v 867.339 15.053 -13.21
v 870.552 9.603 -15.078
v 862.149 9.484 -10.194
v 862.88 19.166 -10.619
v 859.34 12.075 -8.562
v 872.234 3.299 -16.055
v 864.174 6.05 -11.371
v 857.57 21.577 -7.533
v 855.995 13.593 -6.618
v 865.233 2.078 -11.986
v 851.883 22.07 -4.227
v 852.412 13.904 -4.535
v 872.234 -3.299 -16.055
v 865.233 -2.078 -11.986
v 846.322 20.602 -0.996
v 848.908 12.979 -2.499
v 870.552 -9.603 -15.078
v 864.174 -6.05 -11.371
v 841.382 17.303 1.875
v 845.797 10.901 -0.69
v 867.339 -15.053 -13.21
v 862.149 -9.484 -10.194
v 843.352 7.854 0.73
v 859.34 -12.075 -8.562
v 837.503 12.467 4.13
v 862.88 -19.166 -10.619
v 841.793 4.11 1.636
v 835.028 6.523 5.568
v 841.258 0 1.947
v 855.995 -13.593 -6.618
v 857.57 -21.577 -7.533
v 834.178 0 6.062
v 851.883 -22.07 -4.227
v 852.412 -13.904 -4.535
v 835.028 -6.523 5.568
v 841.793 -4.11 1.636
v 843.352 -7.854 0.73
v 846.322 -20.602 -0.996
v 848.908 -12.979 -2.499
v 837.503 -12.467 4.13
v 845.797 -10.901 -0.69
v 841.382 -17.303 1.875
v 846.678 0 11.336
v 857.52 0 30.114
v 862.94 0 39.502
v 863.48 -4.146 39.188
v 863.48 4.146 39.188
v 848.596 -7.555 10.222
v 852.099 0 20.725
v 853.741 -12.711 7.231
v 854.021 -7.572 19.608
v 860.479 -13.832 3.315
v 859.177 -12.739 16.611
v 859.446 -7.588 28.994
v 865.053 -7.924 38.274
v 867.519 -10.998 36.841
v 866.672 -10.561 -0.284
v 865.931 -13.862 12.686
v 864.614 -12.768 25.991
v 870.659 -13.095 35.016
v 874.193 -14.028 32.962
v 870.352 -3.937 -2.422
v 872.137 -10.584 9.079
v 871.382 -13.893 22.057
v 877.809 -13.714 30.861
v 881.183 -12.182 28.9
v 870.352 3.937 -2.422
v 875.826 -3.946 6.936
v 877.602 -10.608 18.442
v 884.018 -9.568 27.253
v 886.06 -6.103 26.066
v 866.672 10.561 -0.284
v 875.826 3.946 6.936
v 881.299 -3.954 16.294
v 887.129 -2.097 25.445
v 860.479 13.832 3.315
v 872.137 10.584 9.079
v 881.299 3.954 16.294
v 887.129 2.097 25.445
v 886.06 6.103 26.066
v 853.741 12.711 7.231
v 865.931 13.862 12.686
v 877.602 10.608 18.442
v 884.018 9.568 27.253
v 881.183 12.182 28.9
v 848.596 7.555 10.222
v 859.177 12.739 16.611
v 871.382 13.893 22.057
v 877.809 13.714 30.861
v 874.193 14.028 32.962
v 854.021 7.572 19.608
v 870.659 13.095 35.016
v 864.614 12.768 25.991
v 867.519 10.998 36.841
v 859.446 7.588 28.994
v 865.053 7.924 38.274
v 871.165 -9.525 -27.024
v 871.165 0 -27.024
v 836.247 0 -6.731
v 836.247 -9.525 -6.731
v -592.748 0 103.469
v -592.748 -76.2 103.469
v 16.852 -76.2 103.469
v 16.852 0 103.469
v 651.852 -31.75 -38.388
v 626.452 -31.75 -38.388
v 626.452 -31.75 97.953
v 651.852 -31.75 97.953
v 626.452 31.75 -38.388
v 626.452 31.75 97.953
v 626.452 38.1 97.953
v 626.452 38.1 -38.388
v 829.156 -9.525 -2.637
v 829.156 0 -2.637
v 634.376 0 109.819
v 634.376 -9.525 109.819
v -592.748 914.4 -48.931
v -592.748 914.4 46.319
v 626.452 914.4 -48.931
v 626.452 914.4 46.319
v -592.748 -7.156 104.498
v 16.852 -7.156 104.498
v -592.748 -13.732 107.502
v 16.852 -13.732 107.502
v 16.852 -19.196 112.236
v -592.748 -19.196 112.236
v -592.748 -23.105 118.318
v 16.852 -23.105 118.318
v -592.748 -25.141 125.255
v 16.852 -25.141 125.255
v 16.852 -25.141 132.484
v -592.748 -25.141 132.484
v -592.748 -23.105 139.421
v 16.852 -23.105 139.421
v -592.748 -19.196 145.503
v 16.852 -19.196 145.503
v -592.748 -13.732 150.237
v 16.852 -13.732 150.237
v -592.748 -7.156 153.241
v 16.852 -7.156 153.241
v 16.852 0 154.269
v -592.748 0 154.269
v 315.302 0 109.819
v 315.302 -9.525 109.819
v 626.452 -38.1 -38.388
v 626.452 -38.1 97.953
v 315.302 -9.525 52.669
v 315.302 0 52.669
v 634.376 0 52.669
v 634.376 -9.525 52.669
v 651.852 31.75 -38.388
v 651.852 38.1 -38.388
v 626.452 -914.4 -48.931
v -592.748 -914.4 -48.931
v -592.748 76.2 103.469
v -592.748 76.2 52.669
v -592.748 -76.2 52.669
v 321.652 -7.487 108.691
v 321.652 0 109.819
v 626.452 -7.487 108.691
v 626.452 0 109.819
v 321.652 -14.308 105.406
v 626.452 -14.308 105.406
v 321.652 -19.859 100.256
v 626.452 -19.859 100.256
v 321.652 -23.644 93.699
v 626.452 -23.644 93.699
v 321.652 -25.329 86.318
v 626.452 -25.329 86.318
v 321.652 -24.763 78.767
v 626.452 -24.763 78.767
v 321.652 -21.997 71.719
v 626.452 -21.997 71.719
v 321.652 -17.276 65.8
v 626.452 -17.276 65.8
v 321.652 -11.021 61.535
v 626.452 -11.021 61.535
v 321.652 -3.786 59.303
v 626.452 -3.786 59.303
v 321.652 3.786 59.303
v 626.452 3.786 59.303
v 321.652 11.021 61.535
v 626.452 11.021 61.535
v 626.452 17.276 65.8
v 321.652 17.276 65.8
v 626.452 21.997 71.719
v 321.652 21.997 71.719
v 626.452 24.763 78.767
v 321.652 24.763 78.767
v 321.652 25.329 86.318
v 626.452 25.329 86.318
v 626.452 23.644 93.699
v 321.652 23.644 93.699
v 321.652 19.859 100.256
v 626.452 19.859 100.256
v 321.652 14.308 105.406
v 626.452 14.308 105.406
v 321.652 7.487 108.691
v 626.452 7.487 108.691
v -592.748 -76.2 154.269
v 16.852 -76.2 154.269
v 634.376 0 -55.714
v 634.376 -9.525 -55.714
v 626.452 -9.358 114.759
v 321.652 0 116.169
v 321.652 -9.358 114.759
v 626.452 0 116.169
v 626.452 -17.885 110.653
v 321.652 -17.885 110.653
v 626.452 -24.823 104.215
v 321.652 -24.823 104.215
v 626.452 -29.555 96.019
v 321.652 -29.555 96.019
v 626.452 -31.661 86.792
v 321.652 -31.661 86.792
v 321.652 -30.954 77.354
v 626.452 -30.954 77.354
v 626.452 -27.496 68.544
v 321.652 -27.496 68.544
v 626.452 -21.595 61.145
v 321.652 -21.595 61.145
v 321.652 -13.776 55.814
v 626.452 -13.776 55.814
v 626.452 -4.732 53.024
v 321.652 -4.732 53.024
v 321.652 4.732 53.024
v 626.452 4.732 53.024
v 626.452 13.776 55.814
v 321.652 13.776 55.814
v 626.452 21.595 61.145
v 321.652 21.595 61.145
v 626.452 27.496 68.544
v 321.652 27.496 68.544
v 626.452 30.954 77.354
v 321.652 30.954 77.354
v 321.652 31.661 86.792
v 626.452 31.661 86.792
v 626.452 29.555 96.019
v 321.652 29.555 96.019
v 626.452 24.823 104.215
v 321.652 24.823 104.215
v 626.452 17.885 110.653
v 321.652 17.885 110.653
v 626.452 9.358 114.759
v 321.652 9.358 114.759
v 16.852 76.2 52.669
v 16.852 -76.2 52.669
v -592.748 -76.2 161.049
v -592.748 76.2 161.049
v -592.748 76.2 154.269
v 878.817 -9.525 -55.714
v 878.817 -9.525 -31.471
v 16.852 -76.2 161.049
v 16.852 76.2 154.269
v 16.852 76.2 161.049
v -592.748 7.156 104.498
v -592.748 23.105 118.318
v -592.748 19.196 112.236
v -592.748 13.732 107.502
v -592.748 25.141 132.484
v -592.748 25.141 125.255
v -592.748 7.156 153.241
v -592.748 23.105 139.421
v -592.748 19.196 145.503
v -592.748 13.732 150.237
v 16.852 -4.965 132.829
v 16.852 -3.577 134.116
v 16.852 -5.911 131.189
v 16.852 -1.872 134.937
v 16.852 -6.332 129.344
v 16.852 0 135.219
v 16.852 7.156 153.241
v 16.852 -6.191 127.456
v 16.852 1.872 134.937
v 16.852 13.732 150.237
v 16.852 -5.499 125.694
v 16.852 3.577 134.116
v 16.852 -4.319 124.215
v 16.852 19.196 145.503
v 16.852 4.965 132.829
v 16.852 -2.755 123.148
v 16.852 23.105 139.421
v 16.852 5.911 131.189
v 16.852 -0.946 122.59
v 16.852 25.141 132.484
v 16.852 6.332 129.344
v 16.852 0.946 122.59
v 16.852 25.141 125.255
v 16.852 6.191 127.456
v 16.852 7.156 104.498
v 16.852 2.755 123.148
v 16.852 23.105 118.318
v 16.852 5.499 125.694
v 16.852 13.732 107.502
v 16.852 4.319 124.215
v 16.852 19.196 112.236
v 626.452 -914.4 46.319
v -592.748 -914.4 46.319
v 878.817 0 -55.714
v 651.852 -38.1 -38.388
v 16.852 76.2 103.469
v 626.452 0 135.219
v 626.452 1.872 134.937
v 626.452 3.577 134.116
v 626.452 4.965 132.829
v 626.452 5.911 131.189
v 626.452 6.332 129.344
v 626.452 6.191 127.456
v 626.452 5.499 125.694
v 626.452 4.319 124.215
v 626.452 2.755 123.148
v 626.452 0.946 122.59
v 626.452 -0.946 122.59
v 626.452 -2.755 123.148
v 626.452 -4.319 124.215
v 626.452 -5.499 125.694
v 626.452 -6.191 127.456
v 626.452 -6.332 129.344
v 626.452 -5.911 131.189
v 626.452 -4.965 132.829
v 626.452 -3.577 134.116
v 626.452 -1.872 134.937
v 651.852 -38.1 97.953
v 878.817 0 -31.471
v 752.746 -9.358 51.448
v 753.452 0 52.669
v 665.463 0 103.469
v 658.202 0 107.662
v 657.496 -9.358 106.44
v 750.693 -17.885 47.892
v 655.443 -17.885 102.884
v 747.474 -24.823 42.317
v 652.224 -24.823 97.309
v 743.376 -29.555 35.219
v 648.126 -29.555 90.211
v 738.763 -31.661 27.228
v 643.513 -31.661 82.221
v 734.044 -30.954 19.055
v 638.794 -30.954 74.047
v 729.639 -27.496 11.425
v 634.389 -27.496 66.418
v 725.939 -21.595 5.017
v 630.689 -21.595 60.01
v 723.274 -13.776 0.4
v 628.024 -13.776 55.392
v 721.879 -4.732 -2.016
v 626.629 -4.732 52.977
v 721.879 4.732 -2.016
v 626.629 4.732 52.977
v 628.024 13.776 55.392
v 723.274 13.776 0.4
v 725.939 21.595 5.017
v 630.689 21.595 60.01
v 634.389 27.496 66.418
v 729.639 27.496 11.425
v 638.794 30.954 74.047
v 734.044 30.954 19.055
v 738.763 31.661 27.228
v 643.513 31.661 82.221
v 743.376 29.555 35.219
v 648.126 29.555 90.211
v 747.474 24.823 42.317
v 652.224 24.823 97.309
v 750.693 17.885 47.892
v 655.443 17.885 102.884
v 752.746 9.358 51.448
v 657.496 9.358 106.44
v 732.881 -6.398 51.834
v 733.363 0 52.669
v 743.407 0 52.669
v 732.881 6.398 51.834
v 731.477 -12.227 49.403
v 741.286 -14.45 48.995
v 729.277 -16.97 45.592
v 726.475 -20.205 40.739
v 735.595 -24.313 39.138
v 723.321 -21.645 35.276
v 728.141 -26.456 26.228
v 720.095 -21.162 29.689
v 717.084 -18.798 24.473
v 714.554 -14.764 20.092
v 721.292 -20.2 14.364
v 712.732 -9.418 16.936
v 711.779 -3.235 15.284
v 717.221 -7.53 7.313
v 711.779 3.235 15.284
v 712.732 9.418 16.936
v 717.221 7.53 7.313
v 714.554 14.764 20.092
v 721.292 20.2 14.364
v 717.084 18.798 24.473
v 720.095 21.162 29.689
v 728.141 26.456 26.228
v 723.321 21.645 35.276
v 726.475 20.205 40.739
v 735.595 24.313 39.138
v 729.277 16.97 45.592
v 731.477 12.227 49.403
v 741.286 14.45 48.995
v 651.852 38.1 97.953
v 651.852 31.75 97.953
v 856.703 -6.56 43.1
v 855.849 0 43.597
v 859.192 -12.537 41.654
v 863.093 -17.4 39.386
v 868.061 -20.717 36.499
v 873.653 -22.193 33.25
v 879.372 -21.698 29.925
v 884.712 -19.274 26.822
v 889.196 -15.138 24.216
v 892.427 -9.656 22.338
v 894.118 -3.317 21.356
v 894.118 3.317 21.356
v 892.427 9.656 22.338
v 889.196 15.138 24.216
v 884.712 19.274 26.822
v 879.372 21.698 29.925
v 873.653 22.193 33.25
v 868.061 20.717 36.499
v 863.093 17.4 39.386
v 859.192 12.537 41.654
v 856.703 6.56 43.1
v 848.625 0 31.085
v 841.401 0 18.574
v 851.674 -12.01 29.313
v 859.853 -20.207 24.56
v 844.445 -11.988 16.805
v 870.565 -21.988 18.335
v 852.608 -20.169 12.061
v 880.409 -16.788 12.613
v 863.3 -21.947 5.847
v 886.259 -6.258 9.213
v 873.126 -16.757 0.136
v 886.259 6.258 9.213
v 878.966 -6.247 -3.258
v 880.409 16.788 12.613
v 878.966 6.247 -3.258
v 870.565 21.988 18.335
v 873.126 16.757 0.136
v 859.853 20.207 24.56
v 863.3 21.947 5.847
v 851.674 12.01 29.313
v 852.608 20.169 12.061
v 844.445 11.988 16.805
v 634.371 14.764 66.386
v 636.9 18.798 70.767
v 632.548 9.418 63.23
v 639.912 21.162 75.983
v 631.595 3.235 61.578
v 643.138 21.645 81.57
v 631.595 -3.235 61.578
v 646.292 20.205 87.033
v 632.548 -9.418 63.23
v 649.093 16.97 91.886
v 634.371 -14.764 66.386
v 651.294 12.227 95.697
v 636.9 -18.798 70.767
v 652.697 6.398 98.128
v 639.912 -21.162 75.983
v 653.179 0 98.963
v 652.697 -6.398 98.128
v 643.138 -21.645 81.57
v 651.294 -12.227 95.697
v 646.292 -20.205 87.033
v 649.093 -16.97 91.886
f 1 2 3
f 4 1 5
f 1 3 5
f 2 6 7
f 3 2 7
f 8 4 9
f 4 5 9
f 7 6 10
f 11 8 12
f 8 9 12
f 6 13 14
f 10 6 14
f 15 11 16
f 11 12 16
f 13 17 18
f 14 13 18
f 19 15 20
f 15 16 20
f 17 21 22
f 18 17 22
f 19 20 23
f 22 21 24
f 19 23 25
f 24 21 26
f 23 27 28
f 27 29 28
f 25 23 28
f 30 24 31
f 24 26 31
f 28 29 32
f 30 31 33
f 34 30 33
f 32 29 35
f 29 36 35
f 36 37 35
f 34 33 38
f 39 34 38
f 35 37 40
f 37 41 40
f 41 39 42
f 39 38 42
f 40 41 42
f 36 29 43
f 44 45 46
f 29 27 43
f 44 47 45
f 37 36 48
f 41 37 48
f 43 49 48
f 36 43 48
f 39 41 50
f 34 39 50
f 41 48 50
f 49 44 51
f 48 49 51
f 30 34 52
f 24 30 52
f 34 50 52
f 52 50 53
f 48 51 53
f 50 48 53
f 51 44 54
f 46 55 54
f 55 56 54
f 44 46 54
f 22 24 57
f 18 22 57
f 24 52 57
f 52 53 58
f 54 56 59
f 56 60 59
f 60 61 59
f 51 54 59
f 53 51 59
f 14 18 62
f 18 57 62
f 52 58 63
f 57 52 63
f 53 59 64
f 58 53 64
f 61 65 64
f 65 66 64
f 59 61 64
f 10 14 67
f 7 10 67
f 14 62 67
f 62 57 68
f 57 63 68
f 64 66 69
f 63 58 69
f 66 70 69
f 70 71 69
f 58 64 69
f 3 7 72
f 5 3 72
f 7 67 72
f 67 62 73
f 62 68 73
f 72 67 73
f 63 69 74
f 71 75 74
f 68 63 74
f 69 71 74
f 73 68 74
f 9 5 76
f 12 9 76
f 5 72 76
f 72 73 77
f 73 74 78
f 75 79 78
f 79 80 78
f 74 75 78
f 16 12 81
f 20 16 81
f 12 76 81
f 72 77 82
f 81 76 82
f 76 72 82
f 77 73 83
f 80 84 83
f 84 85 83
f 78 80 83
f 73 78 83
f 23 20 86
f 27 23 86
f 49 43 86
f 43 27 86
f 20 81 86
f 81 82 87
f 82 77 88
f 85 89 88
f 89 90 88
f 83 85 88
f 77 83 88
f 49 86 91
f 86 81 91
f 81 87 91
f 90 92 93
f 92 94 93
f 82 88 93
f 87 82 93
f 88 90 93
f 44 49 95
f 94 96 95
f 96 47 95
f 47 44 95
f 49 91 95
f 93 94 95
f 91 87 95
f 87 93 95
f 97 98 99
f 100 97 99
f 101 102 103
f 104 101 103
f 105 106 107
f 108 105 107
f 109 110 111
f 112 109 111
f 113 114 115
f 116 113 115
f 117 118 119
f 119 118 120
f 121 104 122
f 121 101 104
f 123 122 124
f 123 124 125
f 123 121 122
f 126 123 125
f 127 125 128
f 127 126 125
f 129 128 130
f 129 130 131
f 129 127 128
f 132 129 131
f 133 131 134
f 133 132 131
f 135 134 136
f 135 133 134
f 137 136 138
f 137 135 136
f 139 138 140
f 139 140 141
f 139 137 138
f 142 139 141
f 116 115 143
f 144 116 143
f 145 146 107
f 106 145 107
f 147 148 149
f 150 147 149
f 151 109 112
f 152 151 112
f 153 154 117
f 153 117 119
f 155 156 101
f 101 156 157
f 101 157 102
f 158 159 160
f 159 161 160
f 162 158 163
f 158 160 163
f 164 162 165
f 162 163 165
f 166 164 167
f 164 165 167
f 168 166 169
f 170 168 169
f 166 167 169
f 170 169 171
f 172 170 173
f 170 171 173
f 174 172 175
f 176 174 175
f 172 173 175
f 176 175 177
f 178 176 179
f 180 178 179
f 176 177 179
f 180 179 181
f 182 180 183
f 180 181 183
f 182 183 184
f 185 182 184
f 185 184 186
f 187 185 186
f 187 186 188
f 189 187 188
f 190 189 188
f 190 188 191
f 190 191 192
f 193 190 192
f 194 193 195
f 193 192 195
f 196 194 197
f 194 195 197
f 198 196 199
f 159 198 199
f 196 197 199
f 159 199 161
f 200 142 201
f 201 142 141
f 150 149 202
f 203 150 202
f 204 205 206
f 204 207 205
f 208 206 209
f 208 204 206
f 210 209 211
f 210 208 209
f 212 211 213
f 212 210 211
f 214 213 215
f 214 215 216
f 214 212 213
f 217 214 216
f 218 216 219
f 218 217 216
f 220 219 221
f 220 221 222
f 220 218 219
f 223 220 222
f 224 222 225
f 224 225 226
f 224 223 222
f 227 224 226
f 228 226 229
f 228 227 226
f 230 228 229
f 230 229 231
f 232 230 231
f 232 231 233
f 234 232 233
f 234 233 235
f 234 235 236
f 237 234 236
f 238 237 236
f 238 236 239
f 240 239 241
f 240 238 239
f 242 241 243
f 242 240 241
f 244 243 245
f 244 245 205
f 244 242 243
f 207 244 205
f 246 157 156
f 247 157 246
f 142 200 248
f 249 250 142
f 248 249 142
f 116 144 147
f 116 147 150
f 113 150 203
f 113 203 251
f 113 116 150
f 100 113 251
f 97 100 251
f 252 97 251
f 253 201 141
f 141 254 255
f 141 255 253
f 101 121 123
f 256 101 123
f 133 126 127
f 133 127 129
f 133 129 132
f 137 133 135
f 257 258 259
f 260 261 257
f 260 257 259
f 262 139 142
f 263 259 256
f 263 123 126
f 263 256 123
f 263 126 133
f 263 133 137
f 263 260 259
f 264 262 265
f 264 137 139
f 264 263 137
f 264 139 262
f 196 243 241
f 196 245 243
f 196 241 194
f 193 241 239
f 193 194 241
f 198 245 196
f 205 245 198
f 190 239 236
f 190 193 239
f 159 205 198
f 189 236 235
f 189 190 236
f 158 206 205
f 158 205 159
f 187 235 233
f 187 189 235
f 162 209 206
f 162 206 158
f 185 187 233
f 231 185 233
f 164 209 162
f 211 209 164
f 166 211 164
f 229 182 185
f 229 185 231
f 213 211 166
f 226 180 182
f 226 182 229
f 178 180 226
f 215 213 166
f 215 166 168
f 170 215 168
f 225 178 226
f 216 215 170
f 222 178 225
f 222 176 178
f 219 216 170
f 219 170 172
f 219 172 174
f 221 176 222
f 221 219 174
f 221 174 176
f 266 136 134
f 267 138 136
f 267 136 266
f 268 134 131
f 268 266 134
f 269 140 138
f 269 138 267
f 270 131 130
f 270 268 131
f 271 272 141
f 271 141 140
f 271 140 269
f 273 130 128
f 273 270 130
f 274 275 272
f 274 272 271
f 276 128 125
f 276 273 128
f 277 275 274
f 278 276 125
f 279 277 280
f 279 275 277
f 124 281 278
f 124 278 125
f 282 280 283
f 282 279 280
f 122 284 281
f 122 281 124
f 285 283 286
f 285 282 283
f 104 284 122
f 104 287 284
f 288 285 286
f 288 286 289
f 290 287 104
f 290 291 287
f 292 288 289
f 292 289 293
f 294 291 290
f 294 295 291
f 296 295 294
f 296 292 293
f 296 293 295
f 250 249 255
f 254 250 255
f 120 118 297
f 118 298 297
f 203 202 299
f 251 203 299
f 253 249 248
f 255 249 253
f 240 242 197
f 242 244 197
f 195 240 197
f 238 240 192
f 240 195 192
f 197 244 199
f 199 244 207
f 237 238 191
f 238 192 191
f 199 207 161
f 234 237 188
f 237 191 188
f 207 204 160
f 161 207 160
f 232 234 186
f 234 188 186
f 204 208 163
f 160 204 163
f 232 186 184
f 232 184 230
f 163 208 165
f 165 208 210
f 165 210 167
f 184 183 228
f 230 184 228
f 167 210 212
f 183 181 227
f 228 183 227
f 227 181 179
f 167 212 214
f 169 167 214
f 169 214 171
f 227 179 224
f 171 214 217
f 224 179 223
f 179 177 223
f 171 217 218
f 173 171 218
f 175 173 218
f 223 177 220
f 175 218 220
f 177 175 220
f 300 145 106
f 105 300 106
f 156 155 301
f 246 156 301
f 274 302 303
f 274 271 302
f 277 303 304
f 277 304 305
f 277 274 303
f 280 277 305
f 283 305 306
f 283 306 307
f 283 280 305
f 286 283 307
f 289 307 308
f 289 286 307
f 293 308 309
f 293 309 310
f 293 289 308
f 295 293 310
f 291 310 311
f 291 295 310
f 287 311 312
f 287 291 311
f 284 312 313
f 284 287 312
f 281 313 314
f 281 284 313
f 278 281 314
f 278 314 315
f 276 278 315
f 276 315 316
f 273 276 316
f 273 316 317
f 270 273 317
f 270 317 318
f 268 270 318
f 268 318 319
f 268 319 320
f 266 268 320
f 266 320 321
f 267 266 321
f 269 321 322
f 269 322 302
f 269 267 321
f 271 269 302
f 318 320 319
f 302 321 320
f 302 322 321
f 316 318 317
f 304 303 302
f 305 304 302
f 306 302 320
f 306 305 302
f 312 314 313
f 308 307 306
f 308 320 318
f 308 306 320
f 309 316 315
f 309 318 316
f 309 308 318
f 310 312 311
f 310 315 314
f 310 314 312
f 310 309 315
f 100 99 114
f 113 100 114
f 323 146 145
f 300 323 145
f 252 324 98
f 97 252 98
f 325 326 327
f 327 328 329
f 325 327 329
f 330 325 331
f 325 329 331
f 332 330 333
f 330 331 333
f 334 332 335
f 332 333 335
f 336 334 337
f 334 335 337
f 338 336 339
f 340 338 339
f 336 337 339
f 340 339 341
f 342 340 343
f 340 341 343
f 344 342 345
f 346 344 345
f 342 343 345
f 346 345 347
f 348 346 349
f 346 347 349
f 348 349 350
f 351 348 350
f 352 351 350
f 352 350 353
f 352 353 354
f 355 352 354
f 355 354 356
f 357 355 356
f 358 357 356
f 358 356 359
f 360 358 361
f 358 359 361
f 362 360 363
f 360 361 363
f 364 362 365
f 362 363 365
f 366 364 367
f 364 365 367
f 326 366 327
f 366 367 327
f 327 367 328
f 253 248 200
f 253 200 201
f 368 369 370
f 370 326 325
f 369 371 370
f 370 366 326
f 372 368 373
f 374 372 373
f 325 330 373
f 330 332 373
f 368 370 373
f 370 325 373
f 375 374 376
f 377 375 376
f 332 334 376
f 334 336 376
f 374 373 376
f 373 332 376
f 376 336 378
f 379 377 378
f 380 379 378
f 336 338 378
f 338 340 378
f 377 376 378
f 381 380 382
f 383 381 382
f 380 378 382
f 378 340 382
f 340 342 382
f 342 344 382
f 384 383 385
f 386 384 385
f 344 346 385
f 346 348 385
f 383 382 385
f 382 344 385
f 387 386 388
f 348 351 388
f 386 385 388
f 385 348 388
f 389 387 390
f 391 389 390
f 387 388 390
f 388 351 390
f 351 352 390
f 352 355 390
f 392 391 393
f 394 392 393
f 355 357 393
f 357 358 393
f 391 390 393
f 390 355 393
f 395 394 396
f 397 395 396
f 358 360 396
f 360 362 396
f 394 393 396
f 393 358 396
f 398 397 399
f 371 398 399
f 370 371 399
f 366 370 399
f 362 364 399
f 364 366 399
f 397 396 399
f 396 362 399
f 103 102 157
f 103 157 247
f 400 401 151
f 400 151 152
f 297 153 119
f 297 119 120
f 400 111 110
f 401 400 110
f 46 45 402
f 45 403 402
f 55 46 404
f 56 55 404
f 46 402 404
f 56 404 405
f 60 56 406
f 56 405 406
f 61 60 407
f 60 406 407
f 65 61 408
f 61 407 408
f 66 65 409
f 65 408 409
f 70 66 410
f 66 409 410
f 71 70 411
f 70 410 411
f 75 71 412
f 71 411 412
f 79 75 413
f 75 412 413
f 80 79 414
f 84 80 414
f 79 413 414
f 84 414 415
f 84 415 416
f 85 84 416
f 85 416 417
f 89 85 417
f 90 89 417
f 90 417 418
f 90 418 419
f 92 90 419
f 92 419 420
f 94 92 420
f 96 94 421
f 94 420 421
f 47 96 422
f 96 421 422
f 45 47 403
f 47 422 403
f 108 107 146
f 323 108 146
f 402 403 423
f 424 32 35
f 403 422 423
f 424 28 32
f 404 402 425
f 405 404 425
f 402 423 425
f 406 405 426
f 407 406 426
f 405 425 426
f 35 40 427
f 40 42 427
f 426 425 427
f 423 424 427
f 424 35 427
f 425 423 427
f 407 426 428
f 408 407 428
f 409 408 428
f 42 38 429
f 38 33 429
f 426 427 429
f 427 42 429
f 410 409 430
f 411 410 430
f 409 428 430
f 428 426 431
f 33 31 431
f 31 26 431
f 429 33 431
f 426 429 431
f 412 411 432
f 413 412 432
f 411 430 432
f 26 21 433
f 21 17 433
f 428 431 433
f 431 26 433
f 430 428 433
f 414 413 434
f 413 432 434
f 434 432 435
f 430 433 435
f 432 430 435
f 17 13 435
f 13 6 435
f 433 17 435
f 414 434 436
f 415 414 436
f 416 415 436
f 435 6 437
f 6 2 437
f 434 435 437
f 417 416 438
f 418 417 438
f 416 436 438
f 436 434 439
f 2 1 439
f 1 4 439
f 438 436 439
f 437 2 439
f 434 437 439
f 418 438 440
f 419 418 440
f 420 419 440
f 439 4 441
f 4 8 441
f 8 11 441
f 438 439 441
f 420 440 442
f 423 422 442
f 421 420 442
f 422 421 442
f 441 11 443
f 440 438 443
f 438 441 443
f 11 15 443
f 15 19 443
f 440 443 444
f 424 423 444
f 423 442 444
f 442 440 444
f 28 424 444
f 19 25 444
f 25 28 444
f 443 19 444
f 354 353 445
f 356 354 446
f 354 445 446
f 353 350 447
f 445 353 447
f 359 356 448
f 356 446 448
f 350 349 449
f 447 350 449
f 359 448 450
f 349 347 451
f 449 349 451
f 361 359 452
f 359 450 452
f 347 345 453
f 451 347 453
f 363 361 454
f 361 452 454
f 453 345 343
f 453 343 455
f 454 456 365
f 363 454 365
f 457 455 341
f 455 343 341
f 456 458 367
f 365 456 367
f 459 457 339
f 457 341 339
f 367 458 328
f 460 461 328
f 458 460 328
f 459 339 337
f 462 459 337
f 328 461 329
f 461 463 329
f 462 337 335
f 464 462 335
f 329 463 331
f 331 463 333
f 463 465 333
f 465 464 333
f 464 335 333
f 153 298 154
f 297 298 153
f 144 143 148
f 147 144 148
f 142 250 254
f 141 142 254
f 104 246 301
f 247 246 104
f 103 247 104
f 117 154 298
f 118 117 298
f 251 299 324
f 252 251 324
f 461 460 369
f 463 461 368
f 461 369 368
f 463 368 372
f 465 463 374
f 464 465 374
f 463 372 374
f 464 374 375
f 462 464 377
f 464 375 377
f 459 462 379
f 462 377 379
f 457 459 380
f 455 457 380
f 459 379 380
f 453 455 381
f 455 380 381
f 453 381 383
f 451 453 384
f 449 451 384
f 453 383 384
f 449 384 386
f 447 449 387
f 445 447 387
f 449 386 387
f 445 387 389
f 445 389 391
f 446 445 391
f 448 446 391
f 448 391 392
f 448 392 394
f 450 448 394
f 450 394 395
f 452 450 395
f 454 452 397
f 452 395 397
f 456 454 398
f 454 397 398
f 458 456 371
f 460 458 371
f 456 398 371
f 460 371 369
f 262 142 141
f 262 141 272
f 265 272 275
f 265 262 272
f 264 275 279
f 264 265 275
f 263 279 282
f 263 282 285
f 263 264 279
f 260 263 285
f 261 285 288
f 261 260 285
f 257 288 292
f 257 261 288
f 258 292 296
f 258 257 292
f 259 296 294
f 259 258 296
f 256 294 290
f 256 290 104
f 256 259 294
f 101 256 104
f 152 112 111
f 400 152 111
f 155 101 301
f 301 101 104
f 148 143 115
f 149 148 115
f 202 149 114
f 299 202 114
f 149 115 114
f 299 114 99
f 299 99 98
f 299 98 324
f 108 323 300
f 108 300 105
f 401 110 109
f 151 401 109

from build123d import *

# Parameters (mm, degrees)
F0_W      = 304.8
F0_H      = 6.35
F0_W_2    = 609.6
F0_H_2    = 6.77982057
F0_H_3    = 50.8
F6_DEPTH  = 76.2
F0_W_3    = 1219.2
F0_H_4    = 95.25
F7_DEPTH  = 914.4
F9_DEPTH  = 25.4
F0_H_5    = 25.4
F10_DEPTH = 9.525


with BuildPart() as f1:
    # F0 (on Front) → F1 (revolve)
    with BuildSketch(Plane.XZ):
        Polygon((655.7809343297, 103.469426218), (653.179416568, 98.963465278), (733.3630443075, 52.669426218), (753.4515406549, 52.669426218), (665.4633596304, 103.469426218), align=None)
        Polygon((658.2015406549, 107.6620393584), (655.7809343297, 103.469426218), (665.4633596304, 103.469426218), align=None)
    revolve(axis=Axis((730.3147216794, 0, 29.3657327882), (0.8660254038, 0, -0.5)))


with BuildPart() as f2:
    # F0 (on Front) → F2 (revolve)
    with BuildSketch(Plane.XZ):
        with Locations((474.0515406549, 112.994426218)):
            Rectangle(F0_W, F0_H)
    revolve(axis=Axis((474.0515406549, 0, 84.419426218), (1, 0, 0)))


with BuildPart() as f3:
    # F0 (on Front) → F3 (revolve)
    with BuildSketch(Plane.XZ):
        Polygon((855.8485904794, 43.5967716205), (834.1779027039, 6.0620393584), (841.257744138, 1.9474267538), (862.9401510761, 39.502457201), align=None)
    revolve(axis=Axis((864.2175841779, 0, 13.7052027119), (0.5024767675, 0, 0.8645907113)))


with BuildPart() as f4:
    # F0 (on Front) → F4 (revolve)
    with BuildSketch(Plane.XZ):
        Polygon((-592.7484593451, 154.269426218), (-592.7484593451, 128.869426218), (16.8515406549, 128.869426218), (16.8515406549, 135.219426218), (16.8515406549, 154.269426218), align=None)
    revolve(axis=Axis((-287.9484593451, 0, 128.869426218), (-1, 0, 0)))

    # F0 (on Front) → F5 (revolve)
    with BuildSketch(Plane.XZ):
        Polygon((16.8515406549, 135.219426218), (16.8515406549, 128.869426218), (626.4515406549, 128.869426218), (626.4515406549, 135.219426218), (554.7779027039, 135.219426218), align=None)
    revolve(axis=Axis((321.6515406549, 0, 128.869426218), (-1, 0, 0)))

    # F0 (on Front) → F6 (join, symmetric)
    with BuildSketch(Plane.XZ):
        with Locations((-287.9484593451, 157.659336503)):
            Rectangle(F0_W_2, F0_H_2)
        with Locations((-287.9484593451, 78.069426218)):
            Rectangle(F0_W_2, F0_H_3)
    extrude(amount=F6_DEPTH, both=True)


with BuildPart() as f7:
    # F0 (on Front) → F7 (new body, symmetric)
    with BuildSketch(Plane.XZ):
        with Locations((16.8515406549, -1.305573782)):
            Rectangle(F0_W_3, F0_H_4)
    extrude(amount=F7_DEPTH, both=True)


with BuildPart() as f9:
    # F8 (on face) → F9 (new body)
    with BuildSketch(Plane.YZ.offset(626.4515406549)):
        Polygon((-31.75, -38.38833794), (-31.75, 84.419426218), (-31.75, 97.9532301426), (-38.1, 97.9532301426), (-38.1, -38.38833794), align=None)
    extrude(amount=F9_DEPTH)


with BuildPart() as f9b:
    # F8 (on face) → F9, piece 2 (new body)
    with BuildSketch(Plane.YZ.offset(626.4515406549)):
        Polygon((38.1, 97.9532301426), (31.75, 97.9532301426), (31.75, 84.419426218), (31.75, -14.3260782923), (31.75, -38.38833794), (38.1, -38.38833794), align=None)
    extrude(amount=F9_DEPTH)


with BuildPart() as f10:
    # F0 (on Front) → F10 (new body)
    with BuildSketch(Plane.XZ):
        with Locations((474.0515406549, 97.119426218)):
            Rectangle(F0_W, F0_H_5)
        Polygon((315.3015375137, 52.669426218), (321.6515406549, 52.669426218), (321.6515406549, 84.419426218), (321.6515406549, 109.819426218), (315.3015375137, 109.819426218), align=None)
        Polygon((365.3527498245, 52.669426218), (626.4515406549, 52.669426218), (626.4515406549, 84.419426218), (321.6515406549, 84.419426218), (321.6515406549, 52.669426218), align=None)
        Polygon((626.4515406549, 84.419426218), (626.4515406549, 52.669426218), (634.3763406549, 66.3955824579), (634.3763406549, 109.819426218), (626.4515406549, 109.819426218), align=None)
        Polygon((634.3763406549, 109.819426218), (634.3763406549, 66.3955824579), (642.3265406549, 80.1657327882), (653.179416568, 98.963465278), align=None)
        Polygon((653.179416568, 98.963465278), (642.3265406549, 80.1657327882), (689.9515406549, 52.669426218), (733.3630443075, 52.669426218), align=None)
        Polygon((642.3265406549, 80.1657327882), (634.3763406549, 66.3955824579), (634.3763406549, 52.669426218), (689.9515406549, 52.669426218), align=None)
        Polygon((634.3763406549, 66.3955824579), (626.4515406549, 52.669426218), (634.3763406549, 52.669426218), align=None)
        Polygon((802.4279027039, -48.930573782), (634.3763406549, 48.0940408048), (634.3763406549, -55.7142719626), (807.9667468622, -55.7142719626), (836.2473392138, -6.7308491415), (829.155778617, -2.636534722), (818.3029027039, -21.4342672118), align=None)
        Polygon((634.3763406549, 52.669426218), (634.3763406549, 48.0940408048), (802.4279027039, -48.930573782), (818.3029027039, -21.4342672118), (689.9515406549, 52.669426218), align=None)
        Polygon((733.3630443075, 52.669426218), (689.9515406549, 52.669426218), (818.3029027039, -21.4342672118), (829.155778617, -2.636534722), align=None)
        Polygon((836.2473392138, -6.7308491415), (807.9667468622, -55.7142719626), (824.2119550705, -55.7142719626), (854.6004848789, -55.7142719626), (871.1648442681, -27.0239599059), (848.3022022869, -13.73680994), align=None)
        Polygon((871.1648442681, -27.0239599059), (854.6004848789, -55.7142719626), (878.8170780003, -55.7142719626), (878.8170780003, -31.4712314529), align=None)
    extrude(amount=F10_DEPTH)


solid = Compound([f1.part, f2.part, f3.part, f4.part, f7.part, f9.part, f9b.part, f10.part])
